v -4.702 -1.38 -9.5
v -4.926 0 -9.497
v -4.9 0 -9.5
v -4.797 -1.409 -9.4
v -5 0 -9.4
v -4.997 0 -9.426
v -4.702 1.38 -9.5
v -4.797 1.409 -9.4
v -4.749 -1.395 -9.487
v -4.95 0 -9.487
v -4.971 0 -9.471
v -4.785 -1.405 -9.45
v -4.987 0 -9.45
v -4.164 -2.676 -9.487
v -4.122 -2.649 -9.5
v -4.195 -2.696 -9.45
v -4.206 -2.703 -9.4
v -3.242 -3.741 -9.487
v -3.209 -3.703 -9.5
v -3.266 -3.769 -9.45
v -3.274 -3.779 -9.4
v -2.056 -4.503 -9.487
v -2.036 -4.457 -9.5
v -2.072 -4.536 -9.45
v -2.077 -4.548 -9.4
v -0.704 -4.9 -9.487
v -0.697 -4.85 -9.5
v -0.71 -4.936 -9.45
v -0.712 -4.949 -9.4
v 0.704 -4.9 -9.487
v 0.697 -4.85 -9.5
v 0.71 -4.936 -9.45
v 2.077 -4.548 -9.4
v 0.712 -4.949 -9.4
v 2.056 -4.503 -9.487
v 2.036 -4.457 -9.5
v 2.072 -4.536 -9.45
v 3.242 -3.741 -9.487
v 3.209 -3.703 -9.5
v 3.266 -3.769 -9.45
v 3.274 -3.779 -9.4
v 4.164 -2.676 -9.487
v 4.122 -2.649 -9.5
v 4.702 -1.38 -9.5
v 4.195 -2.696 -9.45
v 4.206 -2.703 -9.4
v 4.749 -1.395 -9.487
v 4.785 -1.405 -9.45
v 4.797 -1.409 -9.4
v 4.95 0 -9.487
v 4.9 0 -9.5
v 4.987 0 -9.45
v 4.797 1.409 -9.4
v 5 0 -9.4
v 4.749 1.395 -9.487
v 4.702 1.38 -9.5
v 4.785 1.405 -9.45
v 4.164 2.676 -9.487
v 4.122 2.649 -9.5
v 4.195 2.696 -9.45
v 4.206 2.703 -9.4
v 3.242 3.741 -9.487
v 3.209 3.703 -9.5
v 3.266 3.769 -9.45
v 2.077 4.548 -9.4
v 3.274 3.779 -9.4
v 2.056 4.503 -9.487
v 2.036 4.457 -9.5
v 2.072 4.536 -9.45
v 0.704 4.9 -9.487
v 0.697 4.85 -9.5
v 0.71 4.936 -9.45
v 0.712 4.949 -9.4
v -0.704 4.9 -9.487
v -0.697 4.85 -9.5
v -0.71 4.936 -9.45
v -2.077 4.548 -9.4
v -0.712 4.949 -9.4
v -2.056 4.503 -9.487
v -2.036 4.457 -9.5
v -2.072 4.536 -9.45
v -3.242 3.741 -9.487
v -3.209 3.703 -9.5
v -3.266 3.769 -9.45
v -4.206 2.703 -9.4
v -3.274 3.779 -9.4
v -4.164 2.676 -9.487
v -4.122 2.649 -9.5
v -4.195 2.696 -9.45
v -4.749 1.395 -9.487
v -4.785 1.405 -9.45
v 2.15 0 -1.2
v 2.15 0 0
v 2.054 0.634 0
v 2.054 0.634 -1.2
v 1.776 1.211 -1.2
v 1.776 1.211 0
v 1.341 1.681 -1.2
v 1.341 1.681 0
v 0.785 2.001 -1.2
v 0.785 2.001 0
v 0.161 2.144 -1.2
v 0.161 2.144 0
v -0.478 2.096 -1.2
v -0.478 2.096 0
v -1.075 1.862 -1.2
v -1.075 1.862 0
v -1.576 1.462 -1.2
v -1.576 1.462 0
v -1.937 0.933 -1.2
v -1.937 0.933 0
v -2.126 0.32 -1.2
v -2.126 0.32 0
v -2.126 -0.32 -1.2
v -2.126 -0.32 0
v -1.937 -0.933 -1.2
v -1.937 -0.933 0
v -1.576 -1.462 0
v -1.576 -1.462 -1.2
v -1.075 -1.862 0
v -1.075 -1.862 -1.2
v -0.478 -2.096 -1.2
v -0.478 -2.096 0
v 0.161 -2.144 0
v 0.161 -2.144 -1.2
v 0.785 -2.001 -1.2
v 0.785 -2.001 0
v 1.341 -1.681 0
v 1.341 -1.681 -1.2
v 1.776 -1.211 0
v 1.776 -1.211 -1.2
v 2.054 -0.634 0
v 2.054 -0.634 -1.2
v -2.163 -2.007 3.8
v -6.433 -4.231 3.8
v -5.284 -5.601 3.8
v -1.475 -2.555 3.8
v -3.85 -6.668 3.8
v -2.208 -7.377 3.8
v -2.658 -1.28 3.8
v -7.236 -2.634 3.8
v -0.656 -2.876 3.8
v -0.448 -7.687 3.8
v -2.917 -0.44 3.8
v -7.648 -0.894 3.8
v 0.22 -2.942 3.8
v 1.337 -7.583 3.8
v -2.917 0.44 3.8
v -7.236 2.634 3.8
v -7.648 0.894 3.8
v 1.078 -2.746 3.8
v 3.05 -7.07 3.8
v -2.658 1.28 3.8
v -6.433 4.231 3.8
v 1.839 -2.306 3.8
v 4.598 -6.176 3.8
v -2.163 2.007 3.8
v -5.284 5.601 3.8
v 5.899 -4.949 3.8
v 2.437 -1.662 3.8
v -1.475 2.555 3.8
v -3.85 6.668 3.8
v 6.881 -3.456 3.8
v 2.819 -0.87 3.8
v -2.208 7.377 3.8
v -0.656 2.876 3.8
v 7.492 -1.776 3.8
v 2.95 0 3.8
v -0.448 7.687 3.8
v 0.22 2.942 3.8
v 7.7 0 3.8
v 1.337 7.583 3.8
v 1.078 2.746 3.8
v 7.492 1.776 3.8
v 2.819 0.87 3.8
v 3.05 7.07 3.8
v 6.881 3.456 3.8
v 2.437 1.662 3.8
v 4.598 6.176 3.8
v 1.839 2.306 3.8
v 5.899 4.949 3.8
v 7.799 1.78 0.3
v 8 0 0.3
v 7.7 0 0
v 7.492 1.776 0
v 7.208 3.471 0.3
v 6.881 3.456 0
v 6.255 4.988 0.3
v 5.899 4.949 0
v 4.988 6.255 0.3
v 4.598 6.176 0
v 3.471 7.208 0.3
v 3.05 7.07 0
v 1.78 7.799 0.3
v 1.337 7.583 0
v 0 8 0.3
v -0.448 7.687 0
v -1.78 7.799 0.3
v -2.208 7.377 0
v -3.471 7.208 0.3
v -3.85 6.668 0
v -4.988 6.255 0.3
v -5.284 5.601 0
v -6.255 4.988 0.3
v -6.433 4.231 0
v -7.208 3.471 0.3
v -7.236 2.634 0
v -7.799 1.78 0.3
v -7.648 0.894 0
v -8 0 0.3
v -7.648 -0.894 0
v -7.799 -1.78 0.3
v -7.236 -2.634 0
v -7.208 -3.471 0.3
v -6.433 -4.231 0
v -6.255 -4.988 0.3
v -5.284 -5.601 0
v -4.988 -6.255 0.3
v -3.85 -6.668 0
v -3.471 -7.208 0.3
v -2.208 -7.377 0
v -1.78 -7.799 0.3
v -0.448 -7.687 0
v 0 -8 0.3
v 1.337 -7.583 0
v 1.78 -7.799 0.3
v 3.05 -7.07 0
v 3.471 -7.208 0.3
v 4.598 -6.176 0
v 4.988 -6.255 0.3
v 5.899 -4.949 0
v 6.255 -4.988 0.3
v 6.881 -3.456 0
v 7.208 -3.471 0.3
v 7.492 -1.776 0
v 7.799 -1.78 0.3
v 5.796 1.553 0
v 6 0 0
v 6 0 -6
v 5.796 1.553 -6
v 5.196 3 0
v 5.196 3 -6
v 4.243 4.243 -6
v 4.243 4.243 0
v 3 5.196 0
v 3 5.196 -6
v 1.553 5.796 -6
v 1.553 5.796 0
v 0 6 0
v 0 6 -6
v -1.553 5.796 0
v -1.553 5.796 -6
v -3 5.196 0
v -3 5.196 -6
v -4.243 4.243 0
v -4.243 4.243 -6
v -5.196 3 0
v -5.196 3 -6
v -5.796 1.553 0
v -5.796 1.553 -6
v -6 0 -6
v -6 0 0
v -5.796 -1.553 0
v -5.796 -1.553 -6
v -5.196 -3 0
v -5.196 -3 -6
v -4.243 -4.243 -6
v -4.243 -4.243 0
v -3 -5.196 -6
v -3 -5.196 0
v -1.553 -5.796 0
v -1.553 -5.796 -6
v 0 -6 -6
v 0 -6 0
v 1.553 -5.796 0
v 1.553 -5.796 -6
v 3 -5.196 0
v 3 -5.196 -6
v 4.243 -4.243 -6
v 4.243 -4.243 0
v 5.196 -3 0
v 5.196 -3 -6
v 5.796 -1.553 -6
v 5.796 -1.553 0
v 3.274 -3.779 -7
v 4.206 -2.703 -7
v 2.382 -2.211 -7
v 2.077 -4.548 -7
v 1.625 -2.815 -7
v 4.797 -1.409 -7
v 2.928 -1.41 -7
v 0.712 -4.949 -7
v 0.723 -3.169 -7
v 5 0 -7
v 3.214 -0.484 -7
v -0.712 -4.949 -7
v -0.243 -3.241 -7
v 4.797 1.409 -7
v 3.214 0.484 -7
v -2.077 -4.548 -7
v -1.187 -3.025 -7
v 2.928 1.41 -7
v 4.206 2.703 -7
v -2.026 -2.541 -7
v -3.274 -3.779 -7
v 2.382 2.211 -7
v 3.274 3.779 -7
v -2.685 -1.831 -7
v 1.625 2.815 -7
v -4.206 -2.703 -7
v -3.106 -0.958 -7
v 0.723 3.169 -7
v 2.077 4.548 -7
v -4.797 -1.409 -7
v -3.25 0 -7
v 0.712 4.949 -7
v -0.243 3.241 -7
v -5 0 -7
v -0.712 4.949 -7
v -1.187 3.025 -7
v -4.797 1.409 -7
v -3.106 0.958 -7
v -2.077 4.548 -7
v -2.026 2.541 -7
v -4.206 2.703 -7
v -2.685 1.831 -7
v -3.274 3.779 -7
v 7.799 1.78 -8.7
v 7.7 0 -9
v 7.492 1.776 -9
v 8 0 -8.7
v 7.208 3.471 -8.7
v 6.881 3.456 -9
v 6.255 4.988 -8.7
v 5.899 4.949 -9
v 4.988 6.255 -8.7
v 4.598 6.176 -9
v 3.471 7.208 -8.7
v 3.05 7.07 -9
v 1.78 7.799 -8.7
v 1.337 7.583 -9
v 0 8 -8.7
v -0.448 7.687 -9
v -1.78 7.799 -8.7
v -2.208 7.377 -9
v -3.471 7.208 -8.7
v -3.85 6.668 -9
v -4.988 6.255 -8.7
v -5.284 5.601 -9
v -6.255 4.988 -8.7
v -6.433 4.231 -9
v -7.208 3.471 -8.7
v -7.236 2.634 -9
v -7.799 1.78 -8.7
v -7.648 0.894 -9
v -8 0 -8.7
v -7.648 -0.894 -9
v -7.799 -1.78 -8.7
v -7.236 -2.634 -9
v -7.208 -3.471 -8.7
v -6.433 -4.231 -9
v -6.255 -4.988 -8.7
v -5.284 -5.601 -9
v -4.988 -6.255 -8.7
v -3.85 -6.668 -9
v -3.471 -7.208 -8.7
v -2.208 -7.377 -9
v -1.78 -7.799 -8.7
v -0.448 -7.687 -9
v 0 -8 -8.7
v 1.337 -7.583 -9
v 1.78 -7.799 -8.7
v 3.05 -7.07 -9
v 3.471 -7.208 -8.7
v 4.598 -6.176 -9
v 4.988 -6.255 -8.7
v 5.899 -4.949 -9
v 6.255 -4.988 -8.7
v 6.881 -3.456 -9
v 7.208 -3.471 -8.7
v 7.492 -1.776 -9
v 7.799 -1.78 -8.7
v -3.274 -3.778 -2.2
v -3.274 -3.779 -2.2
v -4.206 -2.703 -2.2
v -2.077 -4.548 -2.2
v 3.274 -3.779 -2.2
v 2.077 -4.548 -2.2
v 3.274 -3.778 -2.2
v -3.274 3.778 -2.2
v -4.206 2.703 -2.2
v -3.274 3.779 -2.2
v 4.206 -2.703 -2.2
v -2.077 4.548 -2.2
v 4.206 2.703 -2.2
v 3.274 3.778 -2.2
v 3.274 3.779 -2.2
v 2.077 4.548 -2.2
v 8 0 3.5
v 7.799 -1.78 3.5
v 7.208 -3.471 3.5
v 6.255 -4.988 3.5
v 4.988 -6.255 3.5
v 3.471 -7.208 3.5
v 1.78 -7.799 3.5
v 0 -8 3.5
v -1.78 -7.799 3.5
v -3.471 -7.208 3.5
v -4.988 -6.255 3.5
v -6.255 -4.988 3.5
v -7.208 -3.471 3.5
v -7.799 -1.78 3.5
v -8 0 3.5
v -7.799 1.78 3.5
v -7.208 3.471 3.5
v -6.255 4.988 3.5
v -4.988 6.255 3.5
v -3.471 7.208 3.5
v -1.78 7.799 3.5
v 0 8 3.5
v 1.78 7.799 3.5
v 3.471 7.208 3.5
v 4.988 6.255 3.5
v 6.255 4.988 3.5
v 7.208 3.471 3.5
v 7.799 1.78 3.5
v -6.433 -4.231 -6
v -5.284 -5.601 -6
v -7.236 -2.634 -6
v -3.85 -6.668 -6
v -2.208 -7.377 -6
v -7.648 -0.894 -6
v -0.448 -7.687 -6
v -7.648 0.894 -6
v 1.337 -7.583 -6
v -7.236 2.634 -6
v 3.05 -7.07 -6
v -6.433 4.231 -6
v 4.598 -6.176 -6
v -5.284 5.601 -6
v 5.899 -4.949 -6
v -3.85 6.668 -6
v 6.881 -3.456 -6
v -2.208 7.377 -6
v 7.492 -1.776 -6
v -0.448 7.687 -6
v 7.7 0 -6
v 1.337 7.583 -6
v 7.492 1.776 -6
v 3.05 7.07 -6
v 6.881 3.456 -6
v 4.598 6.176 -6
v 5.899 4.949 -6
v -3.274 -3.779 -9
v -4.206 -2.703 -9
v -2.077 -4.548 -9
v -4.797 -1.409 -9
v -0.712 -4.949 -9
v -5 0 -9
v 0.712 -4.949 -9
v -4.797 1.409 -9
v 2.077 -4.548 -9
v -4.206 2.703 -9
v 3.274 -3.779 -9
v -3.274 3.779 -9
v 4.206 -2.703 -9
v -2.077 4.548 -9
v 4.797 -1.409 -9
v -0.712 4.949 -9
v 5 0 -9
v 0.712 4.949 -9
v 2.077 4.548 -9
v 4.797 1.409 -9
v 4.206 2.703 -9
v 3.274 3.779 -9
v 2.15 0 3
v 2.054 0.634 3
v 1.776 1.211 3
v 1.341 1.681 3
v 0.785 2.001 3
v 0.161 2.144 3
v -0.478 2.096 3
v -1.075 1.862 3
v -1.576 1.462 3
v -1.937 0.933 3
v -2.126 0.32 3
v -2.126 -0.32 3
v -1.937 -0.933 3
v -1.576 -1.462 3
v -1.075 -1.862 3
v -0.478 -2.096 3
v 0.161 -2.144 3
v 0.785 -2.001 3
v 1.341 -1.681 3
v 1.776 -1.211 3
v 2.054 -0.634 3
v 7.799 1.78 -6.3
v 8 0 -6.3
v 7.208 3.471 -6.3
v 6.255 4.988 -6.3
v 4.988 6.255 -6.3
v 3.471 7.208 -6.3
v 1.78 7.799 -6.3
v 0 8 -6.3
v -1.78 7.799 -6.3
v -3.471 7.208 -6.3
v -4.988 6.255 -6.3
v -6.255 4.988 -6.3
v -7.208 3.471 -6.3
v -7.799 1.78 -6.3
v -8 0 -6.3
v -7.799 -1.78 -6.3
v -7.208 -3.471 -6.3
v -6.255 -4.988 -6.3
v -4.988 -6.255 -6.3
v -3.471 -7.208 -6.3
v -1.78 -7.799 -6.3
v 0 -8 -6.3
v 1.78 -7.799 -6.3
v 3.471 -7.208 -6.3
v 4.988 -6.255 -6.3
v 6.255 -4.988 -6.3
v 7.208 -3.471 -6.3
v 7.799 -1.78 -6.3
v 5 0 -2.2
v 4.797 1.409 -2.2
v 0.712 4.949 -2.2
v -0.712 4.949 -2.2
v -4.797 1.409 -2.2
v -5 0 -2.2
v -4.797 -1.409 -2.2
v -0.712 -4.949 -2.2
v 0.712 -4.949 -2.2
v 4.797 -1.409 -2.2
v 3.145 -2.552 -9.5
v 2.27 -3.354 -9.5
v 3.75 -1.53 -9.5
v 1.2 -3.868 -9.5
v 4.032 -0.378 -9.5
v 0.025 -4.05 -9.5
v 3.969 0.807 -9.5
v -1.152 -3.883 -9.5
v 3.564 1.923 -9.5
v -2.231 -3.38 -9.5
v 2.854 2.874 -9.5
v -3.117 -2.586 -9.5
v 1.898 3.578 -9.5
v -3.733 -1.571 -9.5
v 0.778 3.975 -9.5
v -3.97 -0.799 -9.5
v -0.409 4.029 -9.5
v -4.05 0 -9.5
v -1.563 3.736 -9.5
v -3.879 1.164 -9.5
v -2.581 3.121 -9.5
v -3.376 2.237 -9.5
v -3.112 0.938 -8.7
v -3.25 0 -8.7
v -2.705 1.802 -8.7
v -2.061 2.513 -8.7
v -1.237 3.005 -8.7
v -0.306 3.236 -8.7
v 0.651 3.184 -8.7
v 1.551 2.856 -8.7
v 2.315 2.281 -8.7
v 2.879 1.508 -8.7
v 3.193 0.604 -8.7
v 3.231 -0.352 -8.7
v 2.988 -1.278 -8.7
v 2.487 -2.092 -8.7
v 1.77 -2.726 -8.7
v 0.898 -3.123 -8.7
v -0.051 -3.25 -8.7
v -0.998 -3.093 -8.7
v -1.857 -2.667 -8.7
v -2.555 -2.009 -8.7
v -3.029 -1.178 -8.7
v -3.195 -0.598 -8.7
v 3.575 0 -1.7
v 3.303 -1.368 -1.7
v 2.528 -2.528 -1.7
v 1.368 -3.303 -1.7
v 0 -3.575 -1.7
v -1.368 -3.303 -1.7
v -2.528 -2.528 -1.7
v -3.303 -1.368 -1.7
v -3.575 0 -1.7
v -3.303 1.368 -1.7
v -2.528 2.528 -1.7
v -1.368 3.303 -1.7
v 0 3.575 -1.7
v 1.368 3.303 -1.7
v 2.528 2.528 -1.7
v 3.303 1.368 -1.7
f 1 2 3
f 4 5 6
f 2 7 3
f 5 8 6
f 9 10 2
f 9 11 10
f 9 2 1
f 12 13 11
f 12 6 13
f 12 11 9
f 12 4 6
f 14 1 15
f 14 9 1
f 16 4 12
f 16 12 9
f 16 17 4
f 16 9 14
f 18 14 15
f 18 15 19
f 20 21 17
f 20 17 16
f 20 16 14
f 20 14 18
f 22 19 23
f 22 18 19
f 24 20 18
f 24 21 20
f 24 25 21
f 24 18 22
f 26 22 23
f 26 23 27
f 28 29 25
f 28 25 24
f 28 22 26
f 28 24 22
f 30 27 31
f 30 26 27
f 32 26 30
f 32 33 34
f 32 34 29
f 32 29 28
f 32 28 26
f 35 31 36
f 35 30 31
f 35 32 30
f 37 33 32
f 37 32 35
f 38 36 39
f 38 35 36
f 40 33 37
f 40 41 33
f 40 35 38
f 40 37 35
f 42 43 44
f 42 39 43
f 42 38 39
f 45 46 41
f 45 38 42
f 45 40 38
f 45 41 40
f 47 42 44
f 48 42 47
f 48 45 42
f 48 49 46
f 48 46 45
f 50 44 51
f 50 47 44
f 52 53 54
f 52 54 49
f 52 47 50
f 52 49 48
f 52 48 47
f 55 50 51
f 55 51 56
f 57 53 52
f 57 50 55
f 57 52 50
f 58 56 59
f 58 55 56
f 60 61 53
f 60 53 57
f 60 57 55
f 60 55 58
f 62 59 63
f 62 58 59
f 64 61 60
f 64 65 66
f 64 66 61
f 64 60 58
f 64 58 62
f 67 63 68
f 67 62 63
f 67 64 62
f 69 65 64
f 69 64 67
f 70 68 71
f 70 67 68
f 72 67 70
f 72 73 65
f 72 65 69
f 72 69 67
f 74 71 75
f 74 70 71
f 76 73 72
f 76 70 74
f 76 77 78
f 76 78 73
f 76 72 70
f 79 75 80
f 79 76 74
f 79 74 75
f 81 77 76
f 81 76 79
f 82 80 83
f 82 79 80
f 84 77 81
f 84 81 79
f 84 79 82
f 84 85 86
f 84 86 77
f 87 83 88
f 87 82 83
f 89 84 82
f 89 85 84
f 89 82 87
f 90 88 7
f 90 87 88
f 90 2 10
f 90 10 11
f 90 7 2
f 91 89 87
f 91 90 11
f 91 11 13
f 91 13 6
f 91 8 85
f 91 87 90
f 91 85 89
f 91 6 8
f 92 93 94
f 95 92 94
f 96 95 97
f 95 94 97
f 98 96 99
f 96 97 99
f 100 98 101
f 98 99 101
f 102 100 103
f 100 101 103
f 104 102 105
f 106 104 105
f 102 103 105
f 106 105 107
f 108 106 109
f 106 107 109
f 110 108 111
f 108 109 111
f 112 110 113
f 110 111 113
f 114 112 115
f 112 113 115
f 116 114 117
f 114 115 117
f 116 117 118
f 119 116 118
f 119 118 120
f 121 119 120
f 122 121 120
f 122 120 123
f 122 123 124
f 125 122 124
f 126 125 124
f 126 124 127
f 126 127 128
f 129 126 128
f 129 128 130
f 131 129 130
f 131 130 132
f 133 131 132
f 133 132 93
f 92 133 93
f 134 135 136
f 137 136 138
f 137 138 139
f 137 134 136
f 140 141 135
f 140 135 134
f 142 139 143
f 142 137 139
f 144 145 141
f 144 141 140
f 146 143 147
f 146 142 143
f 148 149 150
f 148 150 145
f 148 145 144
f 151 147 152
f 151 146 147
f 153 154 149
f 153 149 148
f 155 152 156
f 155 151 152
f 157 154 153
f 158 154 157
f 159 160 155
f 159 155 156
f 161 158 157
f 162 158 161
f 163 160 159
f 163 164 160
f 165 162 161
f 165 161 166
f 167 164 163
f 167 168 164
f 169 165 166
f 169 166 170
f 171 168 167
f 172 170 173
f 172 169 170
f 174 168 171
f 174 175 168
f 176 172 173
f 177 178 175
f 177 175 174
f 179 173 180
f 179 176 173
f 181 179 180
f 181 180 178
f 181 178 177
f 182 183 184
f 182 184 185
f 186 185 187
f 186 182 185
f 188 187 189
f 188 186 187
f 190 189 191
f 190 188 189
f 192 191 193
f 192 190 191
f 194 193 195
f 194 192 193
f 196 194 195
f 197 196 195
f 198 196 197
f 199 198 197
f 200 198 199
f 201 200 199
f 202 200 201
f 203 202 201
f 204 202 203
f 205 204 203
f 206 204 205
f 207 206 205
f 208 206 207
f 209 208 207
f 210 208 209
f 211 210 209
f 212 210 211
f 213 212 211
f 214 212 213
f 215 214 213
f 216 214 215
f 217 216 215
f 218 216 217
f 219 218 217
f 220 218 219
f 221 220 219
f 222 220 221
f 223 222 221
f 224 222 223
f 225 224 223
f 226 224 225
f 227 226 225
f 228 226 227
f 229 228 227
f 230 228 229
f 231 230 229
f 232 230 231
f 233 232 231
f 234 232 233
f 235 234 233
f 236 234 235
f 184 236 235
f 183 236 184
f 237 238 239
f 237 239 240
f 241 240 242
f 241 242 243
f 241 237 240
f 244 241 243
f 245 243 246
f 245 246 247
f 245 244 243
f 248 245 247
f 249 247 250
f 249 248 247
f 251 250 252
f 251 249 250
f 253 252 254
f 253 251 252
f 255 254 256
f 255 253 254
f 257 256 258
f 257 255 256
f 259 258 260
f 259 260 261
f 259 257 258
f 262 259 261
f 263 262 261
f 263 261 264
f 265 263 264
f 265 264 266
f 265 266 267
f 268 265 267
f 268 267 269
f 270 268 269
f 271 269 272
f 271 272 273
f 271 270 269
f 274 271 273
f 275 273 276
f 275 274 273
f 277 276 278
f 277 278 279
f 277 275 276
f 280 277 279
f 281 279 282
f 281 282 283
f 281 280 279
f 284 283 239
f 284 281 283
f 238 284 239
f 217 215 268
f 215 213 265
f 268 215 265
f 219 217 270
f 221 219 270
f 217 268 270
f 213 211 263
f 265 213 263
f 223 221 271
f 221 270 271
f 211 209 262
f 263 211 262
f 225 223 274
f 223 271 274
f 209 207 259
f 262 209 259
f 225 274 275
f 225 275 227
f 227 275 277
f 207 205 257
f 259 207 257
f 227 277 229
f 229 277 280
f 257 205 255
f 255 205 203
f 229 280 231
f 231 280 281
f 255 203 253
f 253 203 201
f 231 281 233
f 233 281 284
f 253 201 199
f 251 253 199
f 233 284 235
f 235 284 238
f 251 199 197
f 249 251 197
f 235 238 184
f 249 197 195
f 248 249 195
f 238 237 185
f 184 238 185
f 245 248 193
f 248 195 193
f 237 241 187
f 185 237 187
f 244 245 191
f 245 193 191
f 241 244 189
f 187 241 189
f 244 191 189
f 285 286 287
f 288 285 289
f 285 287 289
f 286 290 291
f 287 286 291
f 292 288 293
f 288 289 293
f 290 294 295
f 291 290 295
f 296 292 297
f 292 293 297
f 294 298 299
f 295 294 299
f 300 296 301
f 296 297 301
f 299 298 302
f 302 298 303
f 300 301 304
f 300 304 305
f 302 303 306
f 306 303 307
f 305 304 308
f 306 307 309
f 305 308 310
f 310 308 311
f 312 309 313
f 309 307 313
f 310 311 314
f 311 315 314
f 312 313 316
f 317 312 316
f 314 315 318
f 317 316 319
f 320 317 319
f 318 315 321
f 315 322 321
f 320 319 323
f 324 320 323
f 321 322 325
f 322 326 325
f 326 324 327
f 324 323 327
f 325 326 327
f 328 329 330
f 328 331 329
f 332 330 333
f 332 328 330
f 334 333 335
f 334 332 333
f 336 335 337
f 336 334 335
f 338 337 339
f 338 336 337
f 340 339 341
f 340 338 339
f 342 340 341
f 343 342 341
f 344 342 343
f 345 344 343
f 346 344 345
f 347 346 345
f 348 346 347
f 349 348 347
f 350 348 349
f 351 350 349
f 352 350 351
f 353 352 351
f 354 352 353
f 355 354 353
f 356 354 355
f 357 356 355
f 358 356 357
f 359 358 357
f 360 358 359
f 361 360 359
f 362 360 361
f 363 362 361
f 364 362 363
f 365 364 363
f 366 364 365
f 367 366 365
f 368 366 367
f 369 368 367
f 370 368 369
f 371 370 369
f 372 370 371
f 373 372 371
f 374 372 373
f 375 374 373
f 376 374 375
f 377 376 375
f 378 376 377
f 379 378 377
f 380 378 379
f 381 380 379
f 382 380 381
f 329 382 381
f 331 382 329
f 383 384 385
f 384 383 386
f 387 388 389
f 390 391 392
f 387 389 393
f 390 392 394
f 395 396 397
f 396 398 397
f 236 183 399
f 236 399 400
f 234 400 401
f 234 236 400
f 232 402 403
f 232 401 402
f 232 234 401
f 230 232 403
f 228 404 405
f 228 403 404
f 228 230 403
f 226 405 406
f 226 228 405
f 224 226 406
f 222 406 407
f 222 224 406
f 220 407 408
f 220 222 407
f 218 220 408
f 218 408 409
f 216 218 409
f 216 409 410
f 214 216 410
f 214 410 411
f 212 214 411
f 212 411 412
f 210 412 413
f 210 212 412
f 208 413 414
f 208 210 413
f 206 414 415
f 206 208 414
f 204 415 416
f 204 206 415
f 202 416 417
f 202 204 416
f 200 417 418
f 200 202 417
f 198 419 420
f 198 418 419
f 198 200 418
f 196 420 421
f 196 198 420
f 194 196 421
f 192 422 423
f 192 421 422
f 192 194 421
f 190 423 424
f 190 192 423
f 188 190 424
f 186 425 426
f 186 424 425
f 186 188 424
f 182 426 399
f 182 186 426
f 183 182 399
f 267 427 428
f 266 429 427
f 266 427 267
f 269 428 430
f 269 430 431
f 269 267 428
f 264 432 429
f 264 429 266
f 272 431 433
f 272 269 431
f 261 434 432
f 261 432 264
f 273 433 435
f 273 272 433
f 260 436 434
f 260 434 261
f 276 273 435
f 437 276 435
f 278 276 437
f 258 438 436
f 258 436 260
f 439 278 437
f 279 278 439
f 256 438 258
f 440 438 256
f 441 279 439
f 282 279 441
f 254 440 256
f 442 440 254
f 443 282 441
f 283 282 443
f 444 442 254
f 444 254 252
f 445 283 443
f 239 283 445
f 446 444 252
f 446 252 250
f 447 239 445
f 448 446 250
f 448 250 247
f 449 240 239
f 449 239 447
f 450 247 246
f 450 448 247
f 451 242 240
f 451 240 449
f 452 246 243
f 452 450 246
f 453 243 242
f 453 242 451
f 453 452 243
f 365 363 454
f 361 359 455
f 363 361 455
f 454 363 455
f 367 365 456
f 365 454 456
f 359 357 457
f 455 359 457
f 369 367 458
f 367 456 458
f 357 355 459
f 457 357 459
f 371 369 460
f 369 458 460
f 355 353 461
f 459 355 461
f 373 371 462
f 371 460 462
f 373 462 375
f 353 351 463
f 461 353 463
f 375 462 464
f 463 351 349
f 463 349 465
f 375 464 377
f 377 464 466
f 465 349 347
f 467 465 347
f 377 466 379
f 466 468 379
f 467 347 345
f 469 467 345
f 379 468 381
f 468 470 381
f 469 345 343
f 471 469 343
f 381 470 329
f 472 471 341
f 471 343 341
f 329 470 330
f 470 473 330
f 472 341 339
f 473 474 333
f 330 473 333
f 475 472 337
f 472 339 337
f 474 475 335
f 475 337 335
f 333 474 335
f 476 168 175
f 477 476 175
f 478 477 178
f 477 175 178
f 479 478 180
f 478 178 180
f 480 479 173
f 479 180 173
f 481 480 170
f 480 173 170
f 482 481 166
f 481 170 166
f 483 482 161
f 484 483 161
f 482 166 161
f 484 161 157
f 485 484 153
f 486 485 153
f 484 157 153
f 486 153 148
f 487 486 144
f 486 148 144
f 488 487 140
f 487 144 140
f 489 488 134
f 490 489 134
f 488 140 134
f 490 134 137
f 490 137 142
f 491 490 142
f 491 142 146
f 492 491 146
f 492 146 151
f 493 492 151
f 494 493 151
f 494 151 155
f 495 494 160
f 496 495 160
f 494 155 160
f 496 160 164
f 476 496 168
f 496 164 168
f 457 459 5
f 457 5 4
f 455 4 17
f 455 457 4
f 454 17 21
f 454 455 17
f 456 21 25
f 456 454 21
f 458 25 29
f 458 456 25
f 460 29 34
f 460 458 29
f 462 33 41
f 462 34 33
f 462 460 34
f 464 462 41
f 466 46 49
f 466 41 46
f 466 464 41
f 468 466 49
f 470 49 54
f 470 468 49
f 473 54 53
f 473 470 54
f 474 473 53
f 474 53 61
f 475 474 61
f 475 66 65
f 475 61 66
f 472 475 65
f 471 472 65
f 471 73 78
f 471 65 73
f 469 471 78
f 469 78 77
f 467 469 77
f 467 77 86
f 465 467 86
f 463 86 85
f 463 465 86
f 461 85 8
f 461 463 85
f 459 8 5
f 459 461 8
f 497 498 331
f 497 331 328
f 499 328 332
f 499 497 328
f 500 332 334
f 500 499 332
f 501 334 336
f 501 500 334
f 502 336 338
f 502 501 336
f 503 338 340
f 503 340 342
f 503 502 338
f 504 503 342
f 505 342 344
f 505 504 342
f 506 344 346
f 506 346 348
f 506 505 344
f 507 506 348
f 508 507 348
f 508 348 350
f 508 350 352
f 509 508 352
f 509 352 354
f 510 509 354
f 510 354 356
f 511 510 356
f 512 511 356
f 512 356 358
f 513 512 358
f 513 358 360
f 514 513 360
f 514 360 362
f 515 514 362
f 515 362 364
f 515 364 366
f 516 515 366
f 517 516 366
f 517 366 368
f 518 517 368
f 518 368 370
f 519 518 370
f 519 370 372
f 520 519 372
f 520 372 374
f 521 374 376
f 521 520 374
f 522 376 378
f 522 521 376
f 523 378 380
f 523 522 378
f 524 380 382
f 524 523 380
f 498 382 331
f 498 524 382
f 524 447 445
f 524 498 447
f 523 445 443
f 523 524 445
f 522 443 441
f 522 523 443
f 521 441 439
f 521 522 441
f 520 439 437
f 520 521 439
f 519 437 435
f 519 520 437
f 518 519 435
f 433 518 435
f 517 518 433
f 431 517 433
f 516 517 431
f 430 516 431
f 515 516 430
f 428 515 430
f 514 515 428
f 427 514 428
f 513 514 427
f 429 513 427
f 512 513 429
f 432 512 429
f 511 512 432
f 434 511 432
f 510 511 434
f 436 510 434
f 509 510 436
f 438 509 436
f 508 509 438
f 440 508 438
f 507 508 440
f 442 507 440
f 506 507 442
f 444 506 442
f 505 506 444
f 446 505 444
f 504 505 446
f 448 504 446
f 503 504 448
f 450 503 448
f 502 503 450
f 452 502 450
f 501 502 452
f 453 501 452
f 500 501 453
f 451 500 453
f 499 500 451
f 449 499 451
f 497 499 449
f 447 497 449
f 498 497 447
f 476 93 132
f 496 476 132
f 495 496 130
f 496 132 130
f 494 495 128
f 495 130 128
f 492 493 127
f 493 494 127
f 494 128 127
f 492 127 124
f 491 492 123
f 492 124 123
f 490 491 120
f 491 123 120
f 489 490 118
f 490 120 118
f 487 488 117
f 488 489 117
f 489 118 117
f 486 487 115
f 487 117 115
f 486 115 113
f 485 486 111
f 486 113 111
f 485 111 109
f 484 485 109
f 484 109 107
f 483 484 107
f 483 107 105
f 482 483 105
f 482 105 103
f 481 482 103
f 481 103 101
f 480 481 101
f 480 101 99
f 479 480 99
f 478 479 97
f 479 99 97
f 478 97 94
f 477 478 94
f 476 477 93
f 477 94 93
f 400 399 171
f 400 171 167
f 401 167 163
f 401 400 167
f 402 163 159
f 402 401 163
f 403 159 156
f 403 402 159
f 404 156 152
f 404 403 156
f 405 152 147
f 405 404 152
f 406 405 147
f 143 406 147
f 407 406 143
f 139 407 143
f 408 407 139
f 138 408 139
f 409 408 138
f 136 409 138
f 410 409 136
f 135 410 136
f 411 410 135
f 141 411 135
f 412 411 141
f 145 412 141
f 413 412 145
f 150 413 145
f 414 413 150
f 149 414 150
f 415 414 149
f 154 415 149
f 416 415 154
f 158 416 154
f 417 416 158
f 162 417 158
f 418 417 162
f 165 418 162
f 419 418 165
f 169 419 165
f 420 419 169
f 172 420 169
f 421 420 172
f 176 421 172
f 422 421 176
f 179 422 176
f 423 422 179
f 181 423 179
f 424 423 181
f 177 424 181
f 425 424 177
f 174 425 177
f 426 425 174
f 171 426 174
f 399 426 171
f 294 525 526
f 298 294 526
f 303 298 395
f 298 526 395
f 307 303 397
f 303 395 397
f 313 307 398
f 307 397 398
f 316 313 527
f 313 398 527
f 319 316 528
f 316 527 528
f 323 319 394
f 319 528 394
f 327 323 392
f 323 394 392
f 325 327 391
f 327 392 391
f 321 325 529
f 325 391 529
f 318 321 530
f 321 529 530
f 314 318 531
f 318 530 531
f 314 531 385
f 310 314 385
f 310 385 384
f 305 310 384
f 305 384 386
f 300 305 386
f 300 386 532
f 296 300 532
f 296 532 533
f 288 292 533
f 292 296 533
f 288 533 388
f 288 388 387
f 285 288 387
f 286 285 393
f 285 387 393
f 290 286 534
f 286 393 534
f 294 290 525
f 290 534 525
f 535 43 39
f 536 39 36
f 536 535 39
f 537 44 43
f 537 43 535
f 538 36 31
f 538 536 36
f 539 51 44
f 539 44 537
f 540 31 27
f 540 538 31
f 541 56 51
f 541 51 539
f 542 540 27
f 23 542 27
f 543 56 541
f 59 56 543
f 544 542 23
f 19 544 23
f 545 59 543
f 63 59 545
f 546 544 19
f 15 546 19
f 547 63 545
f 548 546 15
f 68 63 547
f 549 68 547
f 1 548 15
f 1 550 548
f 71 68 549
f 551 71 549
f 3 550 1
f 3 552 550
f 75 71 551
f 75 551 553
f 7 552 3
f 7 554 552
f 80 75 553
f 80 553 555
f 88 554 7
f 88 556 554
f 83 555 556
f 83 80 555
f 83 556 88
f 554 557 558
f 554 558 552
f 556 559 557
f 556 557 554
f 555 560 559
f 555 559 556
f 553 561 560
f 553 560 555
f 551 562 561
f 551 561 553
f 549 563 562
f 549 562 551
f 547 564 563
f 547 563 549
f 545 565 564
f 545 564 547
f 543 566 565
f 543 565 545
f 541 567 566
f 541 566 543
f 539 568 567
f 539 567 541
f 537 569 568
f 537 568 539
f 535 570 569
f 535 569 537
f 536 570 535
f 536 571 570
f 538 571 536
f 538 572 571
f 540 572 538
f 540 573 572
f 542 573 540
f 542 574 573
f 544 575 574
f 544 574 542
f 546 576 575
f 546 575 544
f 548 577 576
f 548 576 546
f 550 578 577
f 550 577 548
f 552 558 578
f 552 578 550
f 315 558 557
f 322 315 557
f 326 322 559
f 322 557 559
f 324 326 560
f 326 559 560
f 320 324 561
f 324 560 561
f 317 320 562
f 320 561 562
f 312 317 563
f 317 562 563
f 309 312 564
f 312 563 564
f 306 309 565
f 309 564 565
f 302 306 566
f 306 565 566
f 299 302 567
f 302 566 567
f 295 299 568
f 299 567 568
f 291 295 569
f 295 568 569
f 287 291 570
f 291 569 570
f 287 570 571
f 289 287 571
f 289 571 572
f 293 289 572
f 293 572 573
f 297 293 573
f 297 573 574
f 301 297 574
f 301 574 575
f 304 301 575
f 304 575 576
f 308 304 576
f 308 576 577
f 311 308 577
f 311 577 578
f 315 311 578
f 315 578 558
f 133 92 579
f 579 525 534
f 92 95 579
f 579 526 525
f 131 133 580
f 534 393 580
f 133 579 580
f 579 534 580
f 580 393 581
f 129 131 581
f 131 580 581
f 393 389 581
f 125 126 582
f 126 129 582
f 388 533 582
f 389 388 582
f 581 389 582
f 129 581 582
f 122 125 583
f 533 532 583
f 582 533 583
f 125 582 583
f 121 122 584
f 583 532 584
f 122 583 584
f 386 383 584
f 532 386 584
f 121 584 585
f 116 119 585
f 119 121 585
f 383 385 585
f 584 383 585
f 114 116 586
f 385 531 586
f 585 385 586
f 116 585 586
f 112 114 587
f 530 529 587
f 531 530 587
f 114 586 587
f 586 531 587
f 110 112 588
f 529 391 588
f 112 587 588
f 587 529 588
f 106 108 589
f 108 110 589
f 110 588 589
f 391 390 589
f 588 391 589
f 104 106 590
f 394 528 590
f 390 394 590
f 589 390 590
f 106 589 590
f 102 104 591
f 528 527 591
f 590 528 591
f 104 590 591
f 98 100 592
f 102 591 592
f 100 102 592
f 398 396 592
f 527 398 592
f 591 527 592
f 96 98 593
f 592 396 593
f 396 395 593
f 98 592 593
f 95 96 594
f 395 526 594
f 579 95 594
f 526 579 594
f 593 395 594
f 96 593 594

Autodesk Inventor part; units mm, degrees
ref_plane "YZ Plane" through (0, 0, 0) normal (1, 0, 0) x (0, 1, 0)
ref_plane "XZ Plane" through (0, 0, 0) normal (0, 1, 0) x (-1, 0, 0)
ref_plane "XY Plane" through (0, 0, 0) normal (0, 0, 1) x (1, 0, 0)
sketch "Эскиз1" plane through (0, 0, 0) normal (0, 0, 1) x (1, 0, 0)
  line L0 (0, 0) -> (0, 15) construction
  line L1 (0, 0) -> (-22, 0) construction
  circle A0 centre (0, 0) radius 2.15
  circle A1 centre (0, 0) radius 8
  circle A2 centre (0, 0) radius 6
  circle A3 centre (0, 0) radius 5
  dimension "d0" = 4.3
  dimension "d1" = 16
  dimension "d2" = 12
  dimension "d3" = 10
extrude "Выдавливание1" add sketch "Эскиз1" along normal blind 3.8 contours A1 | A2 | A3
extrude "Выдавливание2" add sketch "Эскиз1" against normal blind 9 contours A1 | A2
extrude "Выдавливание3" cut sketch "Эскиз1" against normal blind 6 contours A1
extrude "Выдавливание4" add sketch "Эскиз1" against normal blind 2.2 contours A3
chamfer "Фаска1" distance 2.85 distance2 1 1 edges at (-2.15, 0, -2.2) measured on face at (4.0016, -0.3989, -2.2)
sketch "Эскиз2" plane through (0, 0, -9) normal (0, 0, -1) x (-1, 0, 0)
  circle A0 centre (0, 0) radius 5
  circle A1 centre (0, 0) radius 3.25
  dimension "d15" = 10
  dimension "d16" = 6.5
extrude "Выдавливание5" add sketch "Эскиз2" along normal blind 0.5 and the other way blind 2
chamfer "Фаска2" distance 0.8 angle 45 1 edges at (3.25, 0, -9.5)
fillet "Сопряжение1" radius 0.1 1 edges at (5, 0, -9.5)
chamfer "Фаска3" distance 0.8 angle 45 1 edges at (-2.15, 0, 3.8)
chamfer "Фаска4" distance 0.3 angle 45 4 edges at (-8, 0, 3.8) (-8, 0, 0) (-8, 0, -6) (-8, 0, -9)
properties part number "втулка фитинг"
